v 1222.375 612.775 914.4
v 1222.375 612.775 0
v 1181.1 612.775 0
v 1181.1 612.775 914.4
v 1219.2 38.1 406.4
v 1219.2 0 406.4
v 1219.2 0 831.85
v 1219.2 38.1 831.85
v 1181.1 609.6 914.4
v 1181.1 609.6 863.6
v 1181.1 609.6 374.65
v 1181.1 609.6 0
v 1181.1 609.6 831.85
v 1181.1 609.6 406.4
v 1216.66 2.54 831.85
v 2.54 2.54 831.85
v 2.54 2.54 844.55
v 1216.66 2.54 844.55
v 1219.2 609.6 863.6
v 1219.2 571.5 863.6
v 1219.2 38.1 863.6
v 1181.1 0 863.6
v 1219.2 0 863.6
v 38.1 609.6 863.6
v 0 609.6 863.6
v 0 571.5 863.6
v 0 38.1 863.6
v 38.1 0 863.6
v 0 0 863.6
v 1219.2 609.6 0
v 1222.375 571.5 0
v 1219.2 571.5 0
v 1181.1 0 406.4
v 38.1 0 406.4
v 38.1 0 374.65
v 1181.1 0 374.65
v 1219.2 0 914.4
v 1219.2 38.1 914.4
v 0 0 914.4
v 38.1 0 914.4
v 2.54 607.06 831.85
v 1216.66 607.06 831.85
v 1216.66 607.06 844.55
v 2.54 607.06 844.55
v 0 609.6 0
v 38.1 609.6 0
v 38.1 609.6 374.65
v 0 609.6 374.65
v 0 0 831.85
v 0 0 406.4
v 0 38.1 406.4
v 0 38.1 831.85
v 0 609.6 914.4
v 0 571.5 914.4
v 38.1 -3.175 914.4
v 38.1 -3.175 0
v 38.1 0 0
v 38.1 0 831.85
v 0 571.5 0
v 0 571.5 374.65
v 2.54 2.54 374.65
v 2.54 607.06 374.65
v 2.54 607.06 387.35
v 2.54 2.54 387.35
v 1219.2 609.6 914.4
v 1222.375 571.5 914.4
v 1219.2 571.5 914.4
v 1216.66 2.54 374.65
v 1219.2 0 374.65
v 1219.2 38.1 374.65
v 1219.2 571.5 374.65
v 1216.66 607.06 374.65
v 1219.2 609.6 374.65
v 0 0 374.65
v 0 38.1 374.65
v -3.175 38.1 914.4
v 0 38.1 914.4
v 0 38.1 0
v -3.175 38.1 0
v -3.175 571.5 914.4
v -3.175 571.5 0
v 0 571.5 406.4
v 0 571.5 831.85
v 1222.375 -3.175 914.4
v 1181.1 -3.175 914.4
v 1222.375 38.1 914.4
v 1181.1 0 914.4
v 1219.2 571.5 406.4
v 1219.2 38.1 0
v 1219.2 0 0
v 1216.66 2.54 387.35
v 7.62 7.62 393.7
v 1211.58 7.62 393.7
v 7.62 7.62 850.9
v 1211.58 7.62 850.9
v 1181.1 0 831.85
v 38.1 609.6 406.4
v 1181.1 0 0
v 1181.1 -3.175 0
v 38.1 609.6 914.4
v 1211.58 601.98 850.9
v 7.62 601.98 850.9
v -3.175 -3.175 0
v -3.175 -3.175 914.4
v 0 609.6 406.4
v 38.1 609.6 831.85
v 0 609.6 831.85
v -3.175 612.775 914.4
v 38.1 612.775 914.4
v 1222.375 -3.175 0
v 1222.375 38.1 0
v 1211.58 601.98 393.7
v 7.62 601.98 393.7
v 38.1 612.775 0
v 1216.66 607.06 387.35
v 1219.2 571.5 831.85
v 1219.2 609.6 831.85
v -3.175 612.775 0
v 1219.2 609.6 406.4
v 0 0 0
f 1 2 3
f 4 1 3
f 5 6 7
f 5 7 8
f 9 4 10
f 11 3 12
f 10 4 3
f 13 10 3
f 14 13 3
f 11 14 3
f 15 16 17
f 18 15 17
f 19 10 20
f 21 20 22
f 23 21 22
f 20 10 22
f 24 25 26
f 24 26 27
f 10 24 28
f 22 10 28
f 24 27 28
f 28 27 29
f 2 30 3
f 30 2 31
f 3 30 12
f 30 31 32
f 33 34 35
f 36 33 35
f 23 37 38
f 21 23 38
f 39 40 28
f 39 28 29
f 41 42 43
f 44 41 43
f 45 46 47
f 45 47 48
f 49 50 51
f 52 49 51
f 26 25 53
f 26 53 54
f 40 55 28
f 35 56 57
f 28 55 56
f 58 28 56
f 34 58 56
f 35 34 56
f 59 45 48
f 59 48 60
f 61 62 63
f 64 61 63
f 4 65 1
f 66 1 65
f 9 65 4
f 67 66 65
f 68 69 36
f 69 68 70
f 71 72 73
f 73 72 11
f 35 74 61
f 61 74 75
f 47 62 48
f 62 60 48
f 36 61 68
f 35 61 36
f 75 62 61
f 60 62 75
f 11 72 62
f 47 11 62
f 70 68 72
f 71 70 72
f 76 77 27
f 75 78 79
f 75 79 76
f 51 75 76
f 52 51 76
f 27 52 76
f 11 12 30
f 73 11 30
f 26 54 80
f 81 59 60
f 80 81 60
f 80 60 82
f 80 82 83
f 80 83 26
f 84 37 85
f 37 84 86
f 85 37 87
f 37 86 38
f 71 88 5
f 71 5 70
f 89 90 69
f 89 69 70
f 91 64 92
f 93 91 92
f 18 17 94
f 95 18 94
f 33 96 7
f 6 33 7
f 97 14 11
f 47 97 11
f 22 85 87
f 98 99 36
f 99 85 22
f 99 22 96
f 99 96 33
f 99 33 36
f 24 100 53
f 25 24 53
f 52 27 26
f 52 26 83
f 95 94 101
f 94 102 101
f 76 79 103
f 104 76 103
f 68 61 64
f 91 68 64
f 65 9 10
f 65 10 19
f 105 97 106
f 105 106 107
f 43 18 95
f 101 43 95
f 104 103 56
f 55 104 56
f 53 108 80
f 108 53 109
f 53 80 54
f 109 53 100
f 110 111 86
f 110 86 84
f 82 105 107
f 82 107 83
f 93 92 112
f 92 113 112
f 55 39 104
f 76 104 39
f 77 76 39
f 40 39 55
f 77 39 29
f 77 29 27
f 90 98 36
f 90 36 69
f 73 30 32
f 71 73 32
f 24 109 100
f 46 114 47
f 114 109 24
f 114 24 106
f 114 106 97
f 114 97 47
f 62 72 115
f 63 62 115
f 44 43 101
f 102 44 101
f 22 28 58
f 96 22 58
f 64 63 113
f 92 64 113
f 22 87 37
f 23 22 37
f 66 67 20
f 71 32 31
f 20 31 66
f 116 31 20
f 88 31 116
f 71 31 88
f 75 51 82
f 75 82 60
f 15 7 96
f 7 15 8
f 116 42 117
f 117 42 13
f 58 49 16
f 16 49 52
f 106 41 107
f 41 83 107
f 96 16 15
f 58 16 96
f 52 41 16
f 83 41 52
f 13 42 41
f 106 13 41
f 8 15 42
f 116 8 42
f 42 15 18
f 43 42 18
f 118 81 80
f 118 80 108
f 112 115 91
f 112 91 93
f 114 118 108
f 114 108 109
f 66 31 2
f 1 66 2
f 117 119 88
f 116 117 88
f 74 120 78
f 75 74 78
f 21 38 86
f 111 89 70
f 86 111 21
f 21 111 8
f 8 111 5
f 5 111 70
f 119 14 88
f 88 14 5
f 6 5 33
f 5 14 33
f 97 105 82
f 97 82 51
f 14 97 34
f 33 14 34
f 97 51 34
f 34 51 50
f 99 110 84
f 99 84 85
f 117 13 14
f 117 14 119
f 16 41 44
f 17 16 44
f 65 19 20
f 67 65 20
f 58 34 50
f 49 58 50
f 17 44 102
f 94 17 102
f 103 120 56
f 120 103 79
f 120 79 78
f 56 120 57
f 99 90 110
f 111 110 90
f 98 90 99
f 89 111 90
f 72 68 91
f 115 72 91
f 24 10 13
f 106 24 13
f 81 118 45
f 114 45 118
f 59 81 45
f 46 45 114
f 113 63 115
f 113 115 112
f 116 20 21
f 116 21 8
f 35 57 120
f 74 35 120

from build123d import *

# Parameters (mm, degrees)
F1_DEPTH  = 914.4
F10_W     = 1214.12
F10_H     = 604.52
F11_DEPTH = 12.7
F12_W     = 1214.12
F12_H     = 604.52
F13_DEPTH = 12.7


with BuildPart() as f1:
    # F0 (on Top) → F1 (new body)
    with BuildSketch(Plane.XY):
        Polygon((0, 38.1), (-3.175, 38.1), (-3.175, -3.175), (38.1, -3.175), (38.1, 0), (0, 0), align=None)
    extrude(amount=F1_DEPTH)


with BuildPart() as f4_1:
    # F4: instance of F1
    add(f1.part.mirror(Plane.YZ.offset(609.6)))


with BuildPart() as f5_1:
    # F5: instance of F4_1
    add(f4_1.part.mirror(Plane.XZ.offset(-304.8)))


with BuildPart() as f5_2:
    # F5: instance of F1
    add(f1.part.mirror(Plane.XZ.offset(-304.8)))


with BuildPart() as f1_1:
    add(f1.part)

    add(f4_1.part)  # F9 merges F4_1

    add(f5_1.part)  # F9 merges F5_1

    add(f5_2.part)  # F9 merges F5_2
    # F9: sweep along a path in F7
    with BuildLine(Plane.XY.offset(889)) as f9_path:
        Line((1219.2, 0), (0, 0))
        Line((0, 0), (0, 609.6))
        Line((0, 609.6), (1219.2, 609.6))
        Line((1219.2, 609.6), (1219.2, 0))
    # F8 (on face) → F9 (sweep)
    with BuildSketch(Plane.YZ.offset(38.1)):
        Polygon((2.54, 863.6), (0, 863.6), (0, 831.85), (2.54, 831.85), (2.54, 844.55), (7.62, 850.9), (2.54, 850.9), align=None)
        Polygon((2.54, 406.4), (0, 406.4), (0, 374.65), (2.54, 374.65), (2.54, 387.35), (7.62, 393.7), (2.54, 393.7), align=None)
    sweep(path=f9_path.line, transition=Transition.RIGHT)

    # F10 (on face) → F11 (join)
    with BuildSketch(Plane.XY.offset(850.9)):
        with Locations((609.6, 304.8)):
            Rectangle(F10_W, F10_H)
    extrude(amount=F11_DEPTH)

    # F12 (on face) → F13 (join)
    with BuildSketch(Plane.XY.offset(393.7)):
        with Locations((609.6, 304.8)):
            Rectangle(F12_W, F12_H)
    extrude(amount=F13_DEPTH)


solid = f1_1.part
